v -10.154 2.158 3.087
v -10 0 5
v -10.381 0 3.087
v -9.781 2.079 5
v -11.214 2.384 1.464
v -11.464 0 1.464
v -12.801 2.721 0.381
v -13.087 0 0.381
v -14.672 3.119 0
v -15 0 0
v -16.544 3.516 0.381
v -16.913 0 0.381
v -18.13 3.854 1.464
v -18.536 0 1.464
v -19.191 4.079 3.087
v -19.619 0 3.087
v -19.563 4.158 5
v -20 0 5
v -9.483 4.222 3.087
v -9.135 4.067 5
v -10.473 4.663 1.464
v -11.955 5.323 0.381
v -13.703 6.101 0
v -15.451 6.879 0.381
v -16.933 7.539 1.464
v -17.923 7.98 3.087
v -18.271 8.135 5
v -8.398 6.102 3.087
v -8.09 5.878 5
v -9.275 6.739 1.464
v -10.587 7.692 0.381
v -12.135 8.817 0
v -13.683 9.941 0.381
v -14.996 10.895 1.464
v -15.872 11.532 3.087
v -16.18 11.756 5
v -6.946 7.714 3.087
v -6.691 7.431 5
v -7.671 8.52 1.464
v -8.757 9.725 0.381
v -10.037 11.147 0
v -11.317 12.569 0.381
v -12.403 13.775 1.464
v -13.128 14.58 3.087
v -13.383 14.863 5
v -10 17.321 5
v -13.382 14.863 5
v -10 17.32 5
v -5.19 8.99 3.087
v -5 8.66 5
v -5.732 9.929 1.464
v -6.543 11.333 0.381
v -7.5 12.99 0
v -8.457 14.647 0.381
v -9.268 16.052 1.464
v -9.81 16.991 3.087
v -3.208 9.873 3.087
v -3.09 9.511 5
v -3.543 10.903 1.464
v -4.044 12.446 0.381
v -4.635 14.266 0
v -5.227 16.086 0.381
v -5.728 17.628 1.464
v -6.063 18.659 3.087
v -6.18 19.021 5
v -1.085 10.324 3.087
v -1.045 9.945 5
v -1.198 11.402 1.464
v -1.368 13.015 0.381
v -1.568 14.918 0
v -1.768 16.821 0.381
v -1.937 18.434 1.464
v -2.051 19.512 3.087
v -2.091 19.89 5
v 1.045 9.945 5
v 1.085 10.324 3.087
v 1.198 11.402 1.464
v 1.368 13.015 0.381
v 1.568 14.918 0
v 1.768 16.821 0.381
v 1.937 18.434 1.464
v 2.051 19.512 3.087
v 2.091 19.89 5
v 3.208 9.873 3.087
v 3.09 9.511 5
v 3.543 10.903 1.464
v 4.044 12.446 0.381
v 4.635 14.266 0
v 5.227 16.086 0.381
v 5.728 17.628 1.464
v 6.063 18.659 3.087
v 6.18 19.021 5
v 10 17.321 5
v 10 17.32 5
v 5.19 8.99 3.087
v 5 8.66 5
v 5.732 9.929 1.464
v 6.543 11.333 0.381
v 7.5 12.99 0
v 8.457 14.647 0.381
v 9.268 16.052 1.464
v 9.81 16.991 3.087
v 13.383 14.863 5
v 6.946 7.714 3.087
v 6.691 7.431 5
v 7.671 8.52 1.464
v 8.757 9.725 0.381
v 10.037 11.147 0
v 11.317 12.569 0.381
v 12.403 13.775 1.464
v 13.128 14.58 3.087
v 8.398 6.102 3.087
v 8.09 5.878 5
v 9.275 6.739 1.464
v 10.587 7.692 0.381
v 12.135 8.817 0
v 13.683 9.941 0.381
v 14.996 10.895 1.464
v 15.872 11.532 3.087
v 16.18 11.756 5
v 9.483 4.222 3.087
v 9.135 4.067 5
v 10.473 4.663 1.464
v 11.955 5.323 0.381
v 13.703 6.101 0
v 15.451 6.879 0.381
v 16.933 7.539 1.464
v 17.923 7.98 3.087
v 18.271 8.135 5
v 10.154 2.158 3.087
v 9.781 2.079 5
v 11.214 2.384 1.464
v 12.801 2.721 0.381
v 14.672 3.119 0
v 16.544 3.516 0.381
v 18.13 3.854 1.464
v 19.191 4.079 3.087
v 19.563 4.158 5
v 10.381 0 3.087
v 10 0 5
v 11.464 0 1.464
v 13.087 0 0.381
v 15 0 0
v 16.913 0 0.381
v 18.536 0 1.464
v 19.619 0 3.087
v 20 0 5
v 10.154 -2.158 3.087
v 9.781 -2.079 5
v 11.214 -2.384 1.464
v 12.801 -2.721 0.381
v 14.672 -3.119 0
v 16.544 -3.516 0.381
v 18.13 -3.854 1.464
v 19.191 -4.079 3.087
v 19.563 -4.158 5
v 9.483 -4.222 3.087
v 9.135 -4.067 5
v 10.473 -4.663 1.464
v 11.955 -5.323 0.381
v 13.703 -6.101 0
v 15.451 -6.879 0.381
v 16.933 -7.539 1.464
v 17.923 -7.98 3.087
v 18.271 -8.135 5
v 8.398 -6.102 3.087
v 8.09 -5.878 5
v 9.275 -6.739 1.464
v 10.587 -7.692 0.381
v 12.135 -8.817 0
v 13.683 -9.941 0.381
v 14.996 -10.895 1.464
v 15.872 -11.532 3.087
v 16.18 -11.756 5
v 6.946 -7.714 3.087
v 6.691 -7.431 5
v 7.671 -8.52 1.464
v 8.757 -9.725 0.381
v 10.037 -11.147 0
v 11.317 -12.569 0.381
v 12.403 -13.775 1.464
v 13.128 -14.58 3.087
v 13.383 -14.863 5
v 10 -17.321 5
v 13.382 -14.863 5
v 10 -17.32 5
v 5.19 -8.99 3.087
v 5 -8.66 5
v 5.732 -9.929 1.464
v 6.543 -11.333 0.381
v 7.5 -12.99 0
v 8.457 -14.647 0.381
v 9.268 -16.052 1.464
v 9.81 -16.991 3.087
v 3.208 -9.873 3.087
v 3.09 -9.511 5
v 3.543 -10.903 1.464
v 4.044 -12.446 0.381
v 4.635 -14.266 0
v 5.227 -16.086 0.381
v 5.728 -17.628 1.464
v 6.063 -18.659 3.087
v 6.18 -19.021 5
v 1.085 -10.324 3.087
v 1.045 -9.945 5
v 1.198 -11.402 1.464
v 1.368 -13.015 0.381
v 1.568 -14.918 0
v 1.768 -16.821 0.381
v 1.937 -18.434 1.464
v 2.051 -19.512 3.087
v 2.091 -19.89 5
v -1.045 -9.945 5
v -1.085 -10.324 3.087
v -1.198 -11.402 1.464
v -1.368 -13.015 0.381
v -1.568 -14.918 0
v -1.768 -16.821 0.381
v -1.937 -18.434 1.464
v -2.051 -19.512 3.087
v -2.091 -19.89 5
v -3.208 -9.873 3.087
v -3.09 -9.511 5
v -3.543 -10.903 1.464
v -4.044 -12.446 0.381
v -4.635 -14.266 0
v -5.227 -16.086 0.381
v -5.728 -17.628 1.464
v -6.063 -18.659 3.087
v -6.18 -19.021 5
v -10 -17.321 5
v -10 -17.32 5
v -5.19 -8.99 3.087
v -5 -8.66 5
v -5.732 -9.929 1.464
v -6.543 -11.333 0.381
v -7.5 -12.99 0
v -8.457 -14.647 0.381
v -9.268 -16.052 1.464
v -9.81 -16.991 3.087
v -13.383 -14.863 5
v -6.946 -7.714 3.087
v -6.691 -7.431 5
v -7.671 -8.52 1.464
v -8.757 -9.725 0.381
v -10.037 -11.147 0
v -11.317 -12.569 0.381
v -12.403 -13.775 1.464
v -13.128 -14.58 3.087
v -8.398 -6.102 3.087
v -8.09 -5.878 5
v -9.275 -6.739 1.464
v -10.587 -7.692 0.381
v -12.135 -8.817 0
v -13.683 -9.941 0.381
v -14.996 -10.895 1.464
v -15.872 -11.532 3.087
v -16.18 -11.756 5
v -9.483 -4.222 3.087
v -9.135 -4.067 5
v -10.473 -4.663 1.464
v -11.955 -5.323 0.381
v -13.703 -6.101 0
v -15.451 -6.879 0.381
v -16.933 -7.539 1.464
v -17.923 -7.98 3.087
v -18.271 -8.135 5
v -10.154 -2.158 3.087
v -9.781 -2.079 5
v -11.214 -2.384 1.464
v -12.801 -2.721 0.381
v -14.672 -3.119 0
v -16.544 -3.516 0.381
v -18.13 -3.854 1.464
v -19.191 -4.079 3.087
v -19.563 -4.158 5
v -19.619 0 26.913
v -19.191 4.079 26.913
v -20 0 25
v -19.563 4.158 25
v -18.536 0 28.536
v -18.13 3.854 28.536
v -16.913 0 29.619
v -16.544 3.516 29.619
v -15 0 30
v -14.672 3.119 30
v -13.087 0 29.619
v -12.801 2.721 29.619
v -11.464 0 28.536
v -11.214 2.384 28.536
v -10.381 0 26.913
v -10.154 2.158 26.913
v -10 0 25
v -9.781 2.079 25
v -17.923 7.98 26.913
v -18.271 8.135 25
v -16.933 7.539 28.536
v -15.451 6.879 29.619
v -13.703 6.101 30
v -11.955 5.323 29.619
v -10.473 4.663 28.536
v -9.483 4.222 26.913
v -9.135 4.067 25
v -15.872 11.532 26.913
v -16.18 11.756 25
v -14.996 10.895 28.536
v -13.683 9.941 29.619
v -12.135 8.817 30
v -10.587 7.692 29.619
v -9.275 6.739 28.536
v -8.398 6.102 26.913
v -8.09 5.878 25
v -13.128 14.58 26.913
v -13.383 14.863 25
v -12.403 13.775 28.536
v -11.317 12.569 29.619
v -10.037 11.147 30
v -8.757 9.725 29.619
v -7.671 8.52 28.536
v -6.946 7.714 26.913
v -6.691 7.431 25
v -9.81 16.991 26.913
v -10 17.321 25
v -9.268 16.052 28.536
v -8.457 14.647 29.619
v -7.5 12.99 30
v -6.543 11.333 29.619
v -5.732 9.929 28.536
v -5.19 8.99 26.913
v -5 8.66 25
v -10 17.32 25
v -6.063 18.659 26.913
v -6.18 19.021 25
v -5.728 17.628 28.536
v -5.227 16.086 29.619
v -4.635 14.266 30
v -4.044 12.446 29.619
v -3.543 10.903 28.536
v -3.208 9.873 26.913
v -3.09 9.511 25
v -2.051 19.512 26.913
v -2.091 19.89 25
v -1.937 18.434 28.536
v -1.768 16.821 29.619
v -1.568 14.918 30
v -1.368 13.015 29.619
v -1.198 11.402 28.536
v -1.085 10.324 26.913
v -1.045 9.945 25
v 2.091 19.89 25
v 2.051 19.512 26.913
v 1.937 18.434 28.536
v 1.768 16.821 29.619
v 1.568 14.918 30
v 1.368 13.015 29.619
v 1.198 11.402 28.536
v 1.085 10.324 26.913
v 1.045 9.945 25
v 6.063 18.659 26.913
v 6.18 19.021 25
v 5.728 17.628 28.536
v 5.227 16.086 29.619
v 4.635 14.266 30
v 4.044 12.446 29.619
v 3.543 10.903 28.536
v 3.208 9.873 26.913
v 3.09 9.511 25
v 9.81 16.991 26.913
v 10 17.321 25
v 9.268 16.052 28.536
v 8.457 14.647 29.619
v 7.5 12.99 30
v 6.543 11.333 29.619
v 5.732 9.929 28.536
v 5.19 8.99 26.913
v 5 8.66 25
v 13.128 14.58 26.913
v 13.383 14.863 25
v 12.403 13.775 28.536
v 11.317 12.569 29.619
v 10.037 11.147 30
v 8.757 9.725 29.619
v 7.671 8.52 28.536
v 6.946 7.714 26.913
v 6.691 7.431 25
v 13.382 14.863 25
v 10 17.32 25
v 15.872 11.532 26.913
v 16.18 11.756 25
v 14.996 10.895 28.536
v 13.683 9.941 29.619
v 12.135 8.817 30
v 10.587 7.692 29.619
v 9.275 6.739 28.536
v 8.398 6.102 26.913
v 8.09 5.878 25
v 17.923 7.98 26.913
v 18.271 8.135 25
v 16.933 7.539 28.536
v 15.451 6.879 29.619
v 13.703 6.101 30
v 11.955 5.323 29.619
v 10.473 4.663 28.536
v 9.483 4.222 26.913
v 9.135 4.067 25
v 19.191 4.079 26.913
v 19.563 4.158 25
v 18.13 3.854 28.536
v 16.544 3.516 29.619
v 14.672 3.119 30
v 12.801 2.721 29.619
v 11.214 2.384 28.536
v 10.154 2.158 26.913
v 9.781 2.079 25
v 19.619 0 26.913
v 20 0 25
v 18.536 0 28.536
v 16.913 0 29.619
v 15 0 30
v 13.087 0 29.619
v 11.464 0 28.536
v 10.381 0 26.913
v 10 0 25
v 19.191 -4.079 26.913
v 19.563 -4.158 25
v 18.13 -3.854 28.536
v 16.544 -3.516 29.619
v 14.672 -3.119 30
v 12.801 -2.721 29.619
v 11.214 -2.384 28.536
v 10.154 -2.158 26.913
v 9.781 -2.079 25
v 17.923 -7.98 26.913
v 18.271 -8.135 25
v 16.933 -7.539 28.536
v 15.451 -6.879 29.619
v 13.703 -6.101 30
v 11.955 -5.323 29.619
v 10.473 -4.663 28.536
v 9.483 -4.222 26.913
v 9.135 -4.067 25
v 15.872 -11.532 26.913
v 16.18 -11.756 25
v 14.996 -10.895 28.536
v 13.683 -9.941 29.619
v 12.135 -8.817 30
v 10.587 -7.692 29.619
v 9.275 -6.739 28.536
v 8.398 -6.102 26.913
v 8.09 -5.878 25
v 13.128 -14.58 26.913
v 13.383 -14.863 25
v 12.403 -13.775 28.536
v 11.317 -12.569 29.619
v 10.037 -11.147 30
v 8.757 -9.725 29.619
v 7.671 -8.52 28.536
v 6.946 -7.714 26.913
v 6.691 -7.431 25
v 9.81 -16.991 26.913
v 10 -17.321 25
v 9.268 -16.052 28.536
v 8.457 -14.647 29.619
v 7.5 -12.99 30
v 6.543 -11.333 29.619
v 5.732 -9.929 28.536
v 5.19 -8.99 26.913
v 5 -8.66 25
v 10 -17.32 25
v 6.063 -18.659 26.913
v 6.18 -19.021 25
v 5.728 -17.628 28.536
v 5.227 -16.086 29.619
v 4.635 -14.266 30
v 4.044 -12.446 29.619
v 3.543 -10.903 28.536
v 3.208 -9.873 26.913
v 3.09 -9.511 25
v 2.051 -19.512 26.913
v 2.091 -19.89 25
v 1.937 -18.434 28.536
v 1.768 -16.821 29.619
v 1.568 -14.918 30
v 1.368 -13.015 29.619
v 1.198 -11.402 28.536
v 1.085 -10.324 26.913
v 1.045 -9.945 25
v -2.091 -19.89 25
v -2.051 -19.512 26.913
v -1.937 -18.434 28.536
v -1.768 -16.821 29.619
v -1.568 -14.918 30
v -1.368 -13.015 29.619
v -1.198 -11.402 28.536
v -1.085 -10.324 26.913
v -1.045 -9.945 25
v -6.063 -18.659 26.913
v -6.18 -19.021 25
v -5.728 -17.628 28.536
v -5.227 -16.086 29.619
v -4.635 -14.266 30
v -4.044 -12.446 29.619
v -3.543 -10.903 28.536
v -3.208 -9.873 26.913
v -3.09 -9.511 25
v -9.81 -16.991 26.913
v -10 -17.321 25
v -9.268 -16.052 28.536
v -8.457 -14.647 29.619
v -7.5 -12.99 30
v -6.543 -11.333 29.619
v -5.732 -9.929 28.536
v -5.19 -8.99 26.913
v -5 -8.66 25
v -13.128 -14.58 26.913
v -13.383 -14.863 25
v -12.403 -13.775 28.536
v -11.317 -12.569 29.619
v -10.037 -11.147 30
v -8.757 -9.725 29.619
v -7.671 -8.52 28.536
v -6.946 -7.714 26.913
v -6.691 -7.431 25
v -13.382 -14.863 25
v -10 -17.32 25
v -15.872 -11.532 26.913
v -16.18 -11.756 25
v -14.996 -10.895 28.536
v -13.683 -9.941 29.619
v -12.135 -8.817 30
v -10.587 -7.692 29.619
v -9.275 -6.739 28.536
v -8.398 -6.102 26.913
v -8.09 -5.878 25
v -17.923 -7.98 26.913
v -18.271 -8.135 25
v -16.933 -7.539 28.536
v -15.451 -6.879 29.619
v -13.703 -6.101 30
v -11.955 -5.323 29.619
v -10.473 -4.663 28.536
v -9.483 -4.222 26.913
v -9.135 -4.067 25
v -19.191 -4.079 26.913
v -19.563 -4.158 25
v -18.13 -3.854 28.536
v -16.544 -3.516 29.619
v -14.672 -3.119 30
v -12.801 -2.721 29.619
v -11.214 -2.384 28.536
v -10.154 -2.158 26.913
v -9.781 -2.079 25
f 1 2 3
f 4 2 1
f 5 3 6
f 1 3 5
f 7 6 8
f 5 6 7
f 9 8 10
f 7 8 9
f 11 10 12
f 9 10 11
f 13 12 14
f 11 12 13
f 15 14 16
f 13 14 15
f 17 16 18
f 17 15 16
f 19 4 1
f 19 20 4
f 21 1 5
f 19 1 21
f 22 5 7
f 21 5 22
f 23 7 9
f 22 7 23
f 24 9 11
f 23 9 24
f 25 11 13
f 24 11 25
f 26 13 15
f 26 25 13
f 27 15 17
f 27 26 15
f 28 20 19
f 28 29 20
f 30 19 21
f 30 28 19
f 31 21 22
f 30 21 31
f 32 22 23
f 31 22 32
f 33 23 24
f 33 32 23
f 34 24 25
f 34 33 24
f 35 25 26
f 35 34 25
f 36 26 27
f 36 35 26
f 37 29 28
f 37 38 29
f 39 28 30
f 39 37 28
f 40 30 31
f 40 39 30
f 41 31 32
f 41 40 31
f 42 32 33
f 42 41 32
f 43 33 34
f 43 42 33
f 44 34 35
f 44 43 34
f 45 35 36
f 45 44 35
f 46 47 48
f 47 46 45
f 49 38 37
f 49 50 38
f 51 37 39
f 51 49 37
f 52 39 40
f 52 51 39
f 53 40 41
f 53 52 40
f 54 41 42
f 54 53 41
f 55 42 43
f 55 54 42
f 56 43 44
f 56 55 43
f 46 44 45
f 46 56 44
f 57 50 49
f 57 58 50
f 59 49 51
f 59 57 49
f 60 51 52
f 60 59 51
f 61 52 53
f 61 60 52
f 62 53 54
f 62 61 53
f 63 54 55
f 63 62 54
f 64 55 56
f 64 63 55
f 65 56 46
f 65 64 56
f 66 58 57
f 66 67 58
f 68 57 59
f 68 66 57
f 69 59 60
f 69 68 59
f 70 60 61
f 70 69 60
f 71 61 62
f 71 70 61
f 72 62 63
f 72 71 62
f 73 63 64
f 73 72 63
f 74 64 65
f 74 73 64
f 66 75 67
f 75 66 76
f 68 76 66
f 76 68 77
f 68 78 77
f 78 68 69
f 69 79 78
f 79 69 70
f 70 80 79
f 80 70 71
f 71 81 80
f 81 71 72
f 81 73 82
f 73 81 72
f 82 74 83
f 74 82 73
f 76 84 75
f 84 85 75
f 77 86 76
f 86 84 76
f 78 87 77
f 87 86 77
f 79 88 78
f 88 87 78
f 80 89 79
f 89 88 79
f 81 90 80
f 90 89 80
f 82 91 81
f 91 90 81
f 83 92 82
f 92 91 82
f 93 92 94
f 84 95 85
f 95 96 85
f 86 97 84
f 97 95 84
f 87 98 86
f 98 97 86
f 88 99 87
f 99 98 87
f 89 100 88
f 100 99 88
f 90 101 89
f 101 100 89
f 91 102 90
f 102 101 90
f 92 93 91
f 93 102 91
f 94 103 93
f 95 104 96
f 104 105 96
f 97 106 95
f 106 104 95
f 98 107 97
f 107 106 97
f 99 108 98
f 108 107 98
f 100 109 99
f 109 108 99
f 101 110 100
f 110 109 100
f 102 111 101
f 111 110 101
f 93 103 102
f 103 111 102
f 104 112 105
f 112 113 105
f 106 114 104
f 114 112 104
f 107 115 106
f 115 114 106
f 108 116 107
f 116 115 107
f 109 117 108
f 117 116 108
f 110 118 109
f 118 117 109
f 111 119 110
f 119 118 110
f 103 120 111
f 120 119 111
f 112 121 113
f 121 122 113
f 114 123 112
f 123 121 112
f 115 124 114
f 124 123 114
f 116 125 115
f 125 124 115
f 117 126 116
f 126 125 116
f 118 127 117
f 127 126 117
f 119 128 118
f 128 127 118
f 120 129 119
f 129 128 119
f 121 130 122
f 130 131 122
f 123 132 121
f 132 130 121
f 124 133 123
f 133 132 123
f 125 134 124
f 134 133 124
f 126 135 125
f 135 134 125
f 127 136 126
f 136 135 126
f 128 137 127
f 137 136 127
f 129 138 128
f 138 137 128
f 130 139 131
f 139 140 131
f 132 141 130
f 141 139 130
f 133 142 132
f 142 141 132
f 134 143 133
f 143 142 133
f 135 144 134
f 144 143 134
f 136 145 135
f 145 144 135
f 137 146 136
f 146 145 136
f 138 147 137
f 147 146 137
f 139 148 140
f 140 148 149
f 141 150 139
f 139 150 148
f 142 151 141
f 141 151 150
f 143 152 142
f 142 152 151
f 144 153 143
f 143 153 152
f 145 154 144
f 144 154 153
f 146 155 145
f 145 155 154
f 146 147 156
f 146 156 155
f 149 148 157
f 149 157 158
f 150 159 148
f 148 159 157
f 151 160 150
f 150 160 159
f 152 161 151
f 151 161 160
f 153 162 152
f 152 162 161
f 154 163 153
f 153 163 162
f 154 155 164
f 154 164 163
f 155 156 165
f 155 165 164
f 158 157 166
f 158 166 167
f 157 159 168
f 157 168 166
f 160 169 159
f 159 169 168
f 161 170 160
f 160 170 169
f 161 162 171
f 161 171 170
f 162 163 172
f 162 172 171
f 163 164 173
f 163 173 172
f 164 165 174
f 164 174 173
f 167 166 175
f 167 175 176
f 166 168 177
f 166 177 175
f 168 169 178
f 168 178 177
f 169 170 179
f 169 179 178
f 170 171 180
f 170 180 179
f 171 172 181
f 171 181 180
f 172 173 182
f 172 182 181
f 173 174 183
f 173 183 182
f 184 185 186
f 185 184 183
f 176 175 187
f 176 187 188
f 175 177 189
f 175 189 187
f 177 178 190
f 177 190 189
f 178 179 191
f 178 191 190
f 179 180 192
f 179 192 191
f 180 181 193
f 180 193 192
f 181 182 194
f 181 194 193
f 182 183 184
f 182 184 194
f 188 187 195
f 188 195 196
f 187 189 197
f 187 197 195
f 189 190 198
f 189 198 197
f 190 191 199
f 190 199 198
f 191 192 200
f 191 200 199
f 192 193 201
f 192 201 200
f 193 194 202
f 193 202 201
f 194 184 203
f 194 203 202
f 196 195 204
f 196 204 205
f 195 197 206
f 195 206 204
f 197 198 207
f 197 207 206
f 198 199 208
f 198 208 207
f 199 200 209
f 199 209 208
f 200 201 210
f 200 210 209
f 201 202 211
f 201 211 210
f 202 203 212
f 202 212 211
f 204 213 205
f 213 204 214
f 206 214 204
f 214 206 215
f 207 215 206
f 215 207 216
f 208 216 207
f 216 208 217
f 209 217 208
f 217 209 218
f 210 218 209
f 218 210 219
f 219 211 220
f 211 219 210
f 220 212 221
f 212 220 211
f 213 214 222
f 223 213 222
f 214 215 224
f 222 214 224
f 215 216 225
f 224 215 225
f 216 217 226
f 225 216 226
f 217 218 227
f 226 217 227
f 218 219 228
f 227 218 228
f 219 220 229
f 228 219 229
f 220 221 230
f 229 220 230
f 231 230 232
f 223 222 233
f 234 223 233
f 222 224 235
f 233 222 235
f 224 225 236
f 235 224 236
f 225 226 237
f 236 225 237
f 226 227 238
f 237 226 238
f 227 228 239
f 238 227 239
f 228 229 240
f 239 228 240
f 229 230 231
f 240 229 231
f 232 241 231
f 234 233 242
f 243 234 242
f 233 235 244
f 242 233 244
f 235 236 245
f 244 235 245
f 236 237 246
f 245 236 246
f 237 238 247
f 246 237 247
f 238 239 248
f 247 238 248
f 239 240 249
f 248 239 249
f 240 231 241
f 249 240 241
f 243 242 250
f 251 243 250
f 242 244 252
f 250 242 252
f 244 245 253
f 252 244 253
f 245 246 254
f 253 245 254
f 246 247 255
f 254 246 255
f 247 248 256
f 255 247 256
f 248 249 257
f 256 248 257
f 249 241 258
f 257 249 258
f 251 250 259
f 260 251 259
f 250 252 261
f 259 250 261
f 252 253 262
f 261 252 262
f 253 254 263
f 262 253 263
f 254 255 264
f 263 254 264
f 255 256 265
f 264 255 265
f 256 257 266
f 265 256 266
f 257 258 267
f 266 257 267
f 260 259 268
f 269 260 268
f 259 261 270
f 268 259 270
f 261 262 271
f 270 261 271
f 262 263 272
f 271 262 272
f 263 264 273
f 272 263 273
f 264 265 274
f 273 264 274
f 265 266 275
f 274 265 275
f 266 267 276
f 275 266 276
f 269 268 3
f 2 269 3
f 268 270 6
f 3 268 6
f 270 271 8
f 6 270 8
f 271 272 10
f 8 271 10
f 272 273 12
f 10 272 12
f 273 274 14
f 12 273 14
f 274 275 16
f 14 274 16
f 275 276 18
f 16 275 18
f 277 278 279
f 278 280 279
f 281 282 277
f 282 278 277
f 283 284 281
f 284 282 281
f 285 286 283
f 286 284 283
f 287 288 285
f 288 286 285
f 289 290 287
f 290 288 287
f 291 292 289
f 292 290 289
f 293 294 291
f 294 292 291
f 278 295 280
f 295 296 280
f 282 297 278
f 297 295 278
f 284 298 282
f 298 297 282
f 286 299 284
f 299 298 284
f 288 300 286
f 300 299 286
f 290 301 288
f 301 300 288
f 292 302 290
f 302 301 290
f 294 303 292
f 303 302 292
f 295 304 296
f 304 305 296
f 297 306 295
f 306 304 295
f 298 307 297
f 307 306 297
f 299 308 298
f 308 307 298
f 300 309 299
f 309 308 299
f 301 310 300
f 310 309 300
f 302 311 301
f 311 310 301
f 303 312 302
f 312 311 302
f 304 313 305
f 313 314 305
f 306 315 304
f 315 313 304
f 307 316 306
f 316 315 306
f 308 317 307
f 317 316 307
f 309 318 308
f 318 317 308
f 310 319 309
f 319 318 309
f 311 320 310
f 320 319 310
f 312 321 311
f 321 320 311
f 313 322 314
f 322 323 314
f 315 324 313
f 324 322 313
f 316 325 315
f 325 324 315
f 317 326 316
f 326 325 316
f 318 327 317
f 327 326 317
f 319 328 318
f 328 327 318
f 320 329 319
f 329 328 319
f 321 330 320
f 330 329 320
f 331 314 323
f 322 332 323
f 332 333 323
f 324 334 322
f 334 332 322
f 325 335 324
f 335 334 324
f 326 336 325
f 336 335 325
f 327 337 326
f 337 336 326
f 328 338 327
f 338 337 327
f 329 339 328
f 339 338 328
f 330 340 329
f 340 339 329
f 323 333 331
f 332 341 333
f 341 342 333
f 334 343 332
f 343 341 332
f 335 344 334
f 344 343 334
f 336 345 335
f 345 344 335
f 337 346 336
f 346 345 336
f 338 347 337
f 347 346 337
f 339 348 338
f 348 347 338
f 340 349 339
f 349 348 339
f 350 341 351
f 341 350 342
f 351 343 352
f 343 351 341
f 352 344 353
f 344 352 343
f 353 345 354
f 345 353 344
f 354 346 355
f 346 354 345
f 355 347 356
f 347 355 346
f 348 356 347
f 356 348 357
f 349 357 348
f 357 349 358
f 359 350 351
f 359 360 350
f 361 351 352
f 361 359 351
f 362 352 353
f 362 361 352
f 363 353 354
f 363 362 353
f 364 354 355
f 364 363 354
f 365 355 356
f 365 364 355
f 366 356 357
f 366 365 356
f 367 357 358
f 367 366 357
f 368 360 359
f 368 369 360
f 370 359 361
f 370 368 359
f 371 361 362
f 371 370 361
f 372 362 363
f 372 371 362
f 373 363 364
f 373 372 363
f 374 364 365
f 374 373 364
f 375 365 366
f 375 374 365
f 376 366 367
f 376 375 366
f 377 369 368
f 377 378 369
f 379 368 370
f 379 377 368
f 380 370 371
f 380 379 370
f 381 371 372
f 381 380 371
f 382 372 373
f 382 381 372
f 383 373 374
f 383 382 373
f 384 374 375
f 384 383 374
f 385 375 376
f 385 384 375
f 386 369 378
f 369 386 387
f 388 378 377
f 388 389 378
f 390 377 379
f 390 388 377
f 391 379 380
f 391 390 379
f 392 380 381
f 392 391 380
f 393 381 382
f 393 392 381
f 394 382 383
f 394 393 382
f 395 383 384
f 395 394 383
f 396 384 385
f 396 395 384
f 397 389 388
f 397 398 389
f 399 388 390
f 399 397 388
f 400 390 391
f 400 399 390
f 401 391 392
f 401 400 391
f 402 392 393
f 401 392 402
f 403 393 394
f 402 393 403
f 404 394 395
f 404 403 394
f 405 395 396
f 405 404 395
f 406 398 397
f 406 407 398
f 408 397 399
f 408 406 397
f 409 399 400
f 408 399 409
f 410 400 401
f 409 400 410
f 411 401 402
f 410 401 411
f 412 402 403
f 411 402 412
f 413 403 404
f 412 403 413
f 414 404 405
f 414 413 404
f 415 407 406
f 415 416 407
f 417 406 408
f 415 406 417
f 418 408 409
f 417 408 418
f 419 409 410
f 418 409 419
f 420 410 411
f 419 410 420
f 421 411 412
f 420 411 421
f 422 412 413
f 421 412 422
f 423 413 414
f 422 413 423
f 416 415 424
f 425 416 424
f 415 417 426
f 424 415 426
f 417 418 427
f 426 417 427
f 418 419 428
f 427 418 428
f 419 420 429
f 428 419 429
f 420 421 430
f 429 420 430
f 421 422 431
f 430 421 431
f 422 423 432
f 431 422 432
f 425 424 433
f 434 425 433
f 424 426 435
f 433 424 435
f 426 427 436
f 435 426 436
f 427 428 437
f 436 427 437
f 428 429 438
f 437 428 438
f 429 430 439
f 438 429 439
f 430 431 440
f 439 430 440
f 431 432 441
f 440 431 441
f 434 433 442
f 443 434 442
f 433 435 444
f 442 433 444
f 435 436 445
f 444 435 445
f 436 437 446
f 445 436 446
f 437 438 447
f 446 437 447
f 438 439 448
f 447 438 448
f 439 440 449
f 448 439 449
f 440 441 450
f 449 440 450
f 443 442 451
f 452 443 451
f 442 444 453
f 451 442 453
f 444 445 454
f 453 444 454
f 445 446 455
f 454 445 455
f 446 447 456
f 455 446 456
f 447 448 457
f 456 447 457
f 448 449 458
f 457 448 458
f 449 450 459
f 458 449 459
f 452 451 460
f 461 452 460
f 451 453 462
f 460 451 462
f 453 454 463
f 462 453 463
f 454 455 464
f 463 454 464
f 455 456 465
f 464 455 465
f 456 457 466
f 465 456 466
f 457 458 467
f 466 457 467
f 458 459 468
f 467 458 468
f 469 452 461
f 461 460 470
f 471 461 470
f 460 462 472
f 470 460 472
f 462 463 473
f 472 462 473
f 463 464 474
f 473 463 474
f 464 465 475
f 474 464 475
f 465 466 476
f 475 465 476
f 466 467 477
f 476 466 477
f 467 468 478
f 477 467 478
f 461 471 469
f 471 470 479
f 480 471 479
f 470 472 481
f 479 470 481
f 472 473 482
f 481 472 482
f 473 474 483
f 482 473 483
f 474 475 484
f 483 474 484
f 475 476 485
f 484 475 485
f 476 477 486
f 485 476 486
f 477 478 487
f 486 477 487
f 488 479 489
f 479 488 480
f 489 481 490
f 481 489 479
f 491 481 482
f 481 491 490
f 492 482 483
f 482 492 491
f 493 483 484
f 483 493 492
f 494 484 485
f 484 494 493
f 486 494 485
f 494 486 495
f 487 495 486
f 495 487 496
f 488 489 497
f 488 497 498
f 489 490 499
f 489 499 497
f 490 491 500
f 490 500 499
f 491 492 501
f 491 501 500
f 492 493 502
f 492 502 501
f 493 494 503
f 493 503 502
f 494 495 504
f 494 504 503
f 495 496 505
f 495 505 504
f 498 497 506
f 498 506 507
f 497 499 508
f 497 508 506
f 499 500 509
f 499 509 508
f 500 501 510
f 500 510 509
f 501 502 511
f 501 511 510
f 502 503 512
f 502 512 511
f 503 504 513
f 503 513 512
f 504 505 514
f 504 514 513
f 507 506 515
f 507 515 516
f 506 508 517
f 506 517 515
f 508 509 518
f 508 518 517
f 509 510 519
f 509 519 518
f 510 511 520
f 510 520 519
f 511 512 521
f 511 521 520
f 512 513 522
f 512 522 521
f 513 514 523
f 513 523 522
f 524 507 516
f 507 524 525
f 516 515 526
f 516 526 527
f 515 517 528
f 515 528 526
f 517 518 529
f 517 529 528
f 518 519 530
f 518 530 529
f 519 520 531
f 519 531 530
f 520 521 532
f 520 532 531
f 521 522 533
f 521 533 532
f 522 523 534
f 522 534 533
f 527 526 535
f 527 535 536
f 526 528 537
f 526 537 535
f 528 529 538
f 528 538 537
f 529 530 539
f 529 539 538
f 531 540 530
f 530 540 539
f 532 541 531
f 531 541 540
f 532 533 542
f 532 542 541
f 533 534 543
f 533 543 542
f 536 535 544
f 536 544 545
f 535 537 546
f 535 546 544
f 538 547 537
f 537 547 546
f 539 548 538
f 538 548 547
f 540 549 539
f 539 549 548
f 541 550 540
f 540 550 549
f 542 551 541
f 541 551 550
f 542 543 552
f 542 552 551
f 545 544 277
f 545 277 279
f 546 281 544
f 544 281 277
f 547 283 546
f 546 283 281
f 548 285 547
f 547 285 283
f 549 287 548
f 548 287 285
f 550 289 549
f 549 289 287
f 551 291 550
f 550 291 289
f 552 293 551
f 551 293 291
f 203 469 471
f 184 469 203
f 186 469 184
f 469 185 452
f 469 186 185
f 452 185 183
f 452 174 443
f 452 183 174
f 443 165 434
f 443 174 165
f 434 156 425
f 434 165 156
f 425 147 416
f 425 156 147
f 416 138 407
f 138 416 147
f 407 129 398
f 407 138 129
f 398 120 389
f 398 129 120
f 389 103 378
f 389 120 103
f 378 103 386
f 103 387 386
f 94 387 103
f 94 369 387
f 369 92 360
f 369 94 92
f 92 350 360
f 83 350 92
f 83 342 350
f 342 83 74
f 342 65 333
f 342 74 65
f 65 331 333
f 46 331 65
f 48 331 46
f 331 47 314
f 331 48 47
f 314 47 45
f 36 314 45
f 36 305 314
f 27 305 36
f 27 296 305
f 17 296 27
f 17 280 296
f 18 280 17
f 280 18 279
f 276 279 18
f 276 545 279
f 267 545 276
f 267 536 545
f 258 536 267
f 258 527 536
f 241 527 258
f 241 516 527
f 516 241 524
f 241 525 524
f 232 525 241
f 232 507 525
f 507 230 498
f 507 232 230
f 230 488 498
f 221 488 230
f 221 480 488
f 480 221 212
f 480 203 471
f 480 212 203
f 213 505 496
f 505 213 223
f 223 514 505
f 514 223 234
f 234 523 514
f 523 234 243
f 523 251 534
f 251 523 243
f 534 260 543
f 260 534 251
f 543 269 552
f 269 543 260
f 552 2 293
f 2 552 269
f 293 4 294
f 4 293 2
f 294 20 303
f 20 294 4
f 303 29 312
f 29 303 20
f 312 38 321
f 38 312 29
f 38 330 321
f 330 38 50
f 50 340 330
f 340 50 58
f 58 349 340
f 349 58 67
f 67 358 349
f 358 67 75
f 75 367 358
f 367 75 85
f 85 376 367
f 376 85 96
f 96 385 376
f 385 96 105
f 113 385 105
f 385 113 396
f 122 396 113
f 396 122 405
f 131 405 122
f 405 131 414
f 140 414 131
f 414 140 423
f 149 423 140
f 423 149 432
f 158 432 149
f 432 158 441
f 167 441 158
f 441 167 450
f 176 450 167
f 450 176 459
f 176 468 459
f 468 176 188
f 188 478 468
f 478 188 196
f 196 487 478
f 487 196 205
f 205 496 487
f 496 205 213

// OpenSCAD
module tube(od, id, h) {


    translate([0, 0, ((od - id) / 4)]) {
        rotate_extrude() {
            translate([(id + ((od - id) / 2)) / 2, 0, 0]) {
                circle(d = ((od - id) / 2));
            }
        }
    }

    translate([0, 0, h - ((od - id) / 4)]) {
        rotate_extrude() {
            translate([(id / 2) + ((od - id) / 4), 0, 0]) {
                circle(d = ((od - id) / 2));
            }
        }
    }

    translate([0, 0, (od - id) / 4]) {
        color("orange") {
            linear_extrude(height = h - ((od - id) / 2)) {
                difference() {
                    circle(d = od);
                    circle(d = id);
                }
            }
        }
    }
}



module tube2(od, id, h, r) {
    
    color("green") 
    translate([0, 0, 30])
    translate([0, 0, h / 2])
//        rotate_extrude()
            translate([id / 2 + ((od - id) / 4), 0, 0]) 
                square([(od - id) / 2, h], center = true);
    




    
    
    
}





tube(od = 40, id = 20, h = 30);
//tube(od = 10, id = 5, h = 50);


tube2(od = 40, id = 20, h = 30, r = 0);
